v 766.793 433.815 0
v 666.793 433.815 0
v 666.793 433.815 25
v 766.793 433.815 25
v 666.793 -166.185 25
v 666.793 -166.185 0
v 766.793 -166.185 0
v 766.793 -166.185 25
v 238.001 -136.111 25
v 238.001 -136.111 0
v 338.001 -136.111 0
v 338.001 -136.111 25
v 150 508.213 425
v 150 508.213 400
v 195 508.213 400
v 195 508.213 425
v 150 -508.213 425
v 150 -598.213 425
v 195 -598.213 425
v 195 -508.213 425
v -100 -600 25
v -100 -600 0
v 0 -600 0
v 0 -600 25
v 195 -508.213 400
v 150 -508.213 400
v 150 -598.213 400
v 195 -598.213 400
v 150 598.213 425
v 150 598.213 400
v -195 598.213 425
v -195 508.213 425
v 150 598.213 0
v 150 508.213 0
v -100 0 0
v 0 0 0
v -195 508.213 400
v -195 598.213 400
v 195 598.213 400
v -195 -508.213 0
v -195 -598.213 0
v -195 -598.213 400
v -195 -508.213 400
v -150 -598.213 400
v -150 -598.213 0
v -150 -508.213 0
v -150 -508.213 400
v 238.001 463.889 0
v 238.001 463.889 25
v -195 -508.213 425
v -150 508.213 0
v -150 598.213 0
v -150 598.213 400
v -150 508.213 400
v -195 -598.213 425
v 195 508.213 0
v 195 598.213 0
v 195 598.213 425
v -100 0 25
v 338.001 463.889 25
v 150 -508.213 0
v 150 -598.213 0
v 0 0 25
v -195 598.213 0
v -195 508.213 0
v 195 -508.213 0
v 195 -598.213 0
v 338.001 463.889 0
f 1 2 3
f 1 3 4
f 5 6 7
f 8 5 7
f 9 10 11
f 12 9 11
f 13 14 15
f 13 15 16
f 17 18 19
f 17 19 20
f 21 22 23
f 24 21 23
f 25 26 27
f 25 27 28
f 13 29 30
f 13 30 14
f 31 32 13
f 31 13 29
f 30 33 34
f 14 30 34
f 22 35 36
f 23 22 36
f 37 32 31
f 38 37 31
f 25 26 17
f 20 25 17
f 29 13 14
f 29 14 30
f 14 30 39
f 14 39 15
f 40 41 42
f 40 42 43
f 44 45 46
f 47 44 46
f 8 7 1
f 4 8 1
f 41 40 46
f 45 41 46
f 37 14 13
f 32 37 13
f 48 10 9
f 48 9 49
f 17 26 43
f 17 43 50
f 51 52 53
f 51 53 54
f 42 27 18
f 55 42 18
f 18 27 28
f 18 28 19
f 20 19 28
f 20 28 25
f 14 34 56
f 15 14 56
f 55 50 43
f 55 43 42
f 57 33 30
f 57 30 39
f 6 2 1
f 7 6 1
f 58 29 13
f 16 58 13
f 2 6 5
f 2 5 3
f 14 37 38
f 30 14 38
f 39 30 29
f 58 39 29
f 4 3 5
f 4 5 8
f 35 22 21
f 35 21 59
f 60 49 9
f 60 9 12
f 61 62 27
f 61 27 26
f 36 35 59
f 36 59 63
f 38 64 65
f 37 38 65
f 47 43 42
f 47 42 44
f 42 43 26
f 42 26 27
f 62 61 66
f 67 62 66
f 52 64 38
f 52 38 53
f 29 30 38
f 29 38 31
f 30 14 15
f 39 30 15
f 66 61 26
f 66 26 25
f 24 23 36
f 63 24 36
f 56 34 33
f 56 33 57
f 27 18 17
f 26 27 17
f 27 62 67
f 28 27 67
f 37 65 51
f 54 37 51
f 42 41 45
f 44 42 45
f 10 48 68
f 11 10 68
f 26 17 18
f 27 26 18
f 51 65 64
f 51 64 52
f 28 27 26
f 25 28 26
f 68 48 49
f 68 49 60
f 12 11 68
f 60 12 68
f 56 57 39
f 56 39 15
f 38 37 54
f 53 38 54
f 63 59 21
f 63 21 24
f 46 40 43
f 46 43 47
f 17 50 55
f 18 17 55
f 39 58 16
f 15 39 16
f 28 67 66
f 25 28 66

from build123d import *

# Parameters (mm, degrees)
F0_W     = 45
F0_H     = 90
F1_DEPTH = 400
F3_W     = 90
F3_H     = 25
F4_DEPTH = 345
F5_W     = 90
F5_H     = 25
F6_DEPTH = 45
F8_W     = 100
F8_H     = 600
F9_DEPTH = 25


with BuildPart() as f1:
    # F0 (on Top) → F1 (new body)
    with BuildSketch(Plane.XY):
        with Locations((-172.5, -553.213375)):
            Rectangle(F0_W, F0_H)
        with Locations((172.5, -553.213375)):
            Rectangle(F0_W, F0_H)
    extrude(amount=F1_DEPTH)


with BuildPart() as f4:
    # F3 (on face) → F4 (new body)
    with BuildSketch(Plane(origin=(150, 0, 0), x_dir=(0, -1, 0), z_dir=(-1, 0, 0))):
        with Locations((553.213375, 412.5)):
            Rectangle(F3_W, F3_H)
    extrude(amount=F4_DEPTH)


with BuildPart() as f6:
    # F5 (on face) → F6 (new body)
    with BuildSketch(Plane.YZ.offset(150)):
        with Locations((-553.213375, 412.5)):
            Rectangle(F5_W, F5_H)
    extrude(amount=F6_DEPTH)


with BuildPart() as f7_1:
    # F7: instance of F1
    add(f1.part.mirror(Plane.XZ))


with BuildPart() as f7_2:
    # F7: instance of F4
    add(f4.part.mirror(Plane.XZ))


with BuildPart() as f7_3:
    # F7: instance of F6
    add(f6.part.mirror(Plane.XZ))


with BuildPart() as f9:
    # F8 (on Top) → F9 (new body)
    with BuildSketch(Plane.XY):
        with Locations((716.793048, 133.814666)):
            Rectangle(F8_W, F8_H)
        with Locations((288.001406, 163.889024)):
            Rectangle(F8_W, F8_H)
        with Locations((-50, -300)):
            Rectangle(F8_W, F8_H)
    extrude(amount=F9_DEPTH)


solid = Compound([f1.part, f4.part, f6.part, f7_1.part, f7_2.part, f7_3.part, f9.part])
